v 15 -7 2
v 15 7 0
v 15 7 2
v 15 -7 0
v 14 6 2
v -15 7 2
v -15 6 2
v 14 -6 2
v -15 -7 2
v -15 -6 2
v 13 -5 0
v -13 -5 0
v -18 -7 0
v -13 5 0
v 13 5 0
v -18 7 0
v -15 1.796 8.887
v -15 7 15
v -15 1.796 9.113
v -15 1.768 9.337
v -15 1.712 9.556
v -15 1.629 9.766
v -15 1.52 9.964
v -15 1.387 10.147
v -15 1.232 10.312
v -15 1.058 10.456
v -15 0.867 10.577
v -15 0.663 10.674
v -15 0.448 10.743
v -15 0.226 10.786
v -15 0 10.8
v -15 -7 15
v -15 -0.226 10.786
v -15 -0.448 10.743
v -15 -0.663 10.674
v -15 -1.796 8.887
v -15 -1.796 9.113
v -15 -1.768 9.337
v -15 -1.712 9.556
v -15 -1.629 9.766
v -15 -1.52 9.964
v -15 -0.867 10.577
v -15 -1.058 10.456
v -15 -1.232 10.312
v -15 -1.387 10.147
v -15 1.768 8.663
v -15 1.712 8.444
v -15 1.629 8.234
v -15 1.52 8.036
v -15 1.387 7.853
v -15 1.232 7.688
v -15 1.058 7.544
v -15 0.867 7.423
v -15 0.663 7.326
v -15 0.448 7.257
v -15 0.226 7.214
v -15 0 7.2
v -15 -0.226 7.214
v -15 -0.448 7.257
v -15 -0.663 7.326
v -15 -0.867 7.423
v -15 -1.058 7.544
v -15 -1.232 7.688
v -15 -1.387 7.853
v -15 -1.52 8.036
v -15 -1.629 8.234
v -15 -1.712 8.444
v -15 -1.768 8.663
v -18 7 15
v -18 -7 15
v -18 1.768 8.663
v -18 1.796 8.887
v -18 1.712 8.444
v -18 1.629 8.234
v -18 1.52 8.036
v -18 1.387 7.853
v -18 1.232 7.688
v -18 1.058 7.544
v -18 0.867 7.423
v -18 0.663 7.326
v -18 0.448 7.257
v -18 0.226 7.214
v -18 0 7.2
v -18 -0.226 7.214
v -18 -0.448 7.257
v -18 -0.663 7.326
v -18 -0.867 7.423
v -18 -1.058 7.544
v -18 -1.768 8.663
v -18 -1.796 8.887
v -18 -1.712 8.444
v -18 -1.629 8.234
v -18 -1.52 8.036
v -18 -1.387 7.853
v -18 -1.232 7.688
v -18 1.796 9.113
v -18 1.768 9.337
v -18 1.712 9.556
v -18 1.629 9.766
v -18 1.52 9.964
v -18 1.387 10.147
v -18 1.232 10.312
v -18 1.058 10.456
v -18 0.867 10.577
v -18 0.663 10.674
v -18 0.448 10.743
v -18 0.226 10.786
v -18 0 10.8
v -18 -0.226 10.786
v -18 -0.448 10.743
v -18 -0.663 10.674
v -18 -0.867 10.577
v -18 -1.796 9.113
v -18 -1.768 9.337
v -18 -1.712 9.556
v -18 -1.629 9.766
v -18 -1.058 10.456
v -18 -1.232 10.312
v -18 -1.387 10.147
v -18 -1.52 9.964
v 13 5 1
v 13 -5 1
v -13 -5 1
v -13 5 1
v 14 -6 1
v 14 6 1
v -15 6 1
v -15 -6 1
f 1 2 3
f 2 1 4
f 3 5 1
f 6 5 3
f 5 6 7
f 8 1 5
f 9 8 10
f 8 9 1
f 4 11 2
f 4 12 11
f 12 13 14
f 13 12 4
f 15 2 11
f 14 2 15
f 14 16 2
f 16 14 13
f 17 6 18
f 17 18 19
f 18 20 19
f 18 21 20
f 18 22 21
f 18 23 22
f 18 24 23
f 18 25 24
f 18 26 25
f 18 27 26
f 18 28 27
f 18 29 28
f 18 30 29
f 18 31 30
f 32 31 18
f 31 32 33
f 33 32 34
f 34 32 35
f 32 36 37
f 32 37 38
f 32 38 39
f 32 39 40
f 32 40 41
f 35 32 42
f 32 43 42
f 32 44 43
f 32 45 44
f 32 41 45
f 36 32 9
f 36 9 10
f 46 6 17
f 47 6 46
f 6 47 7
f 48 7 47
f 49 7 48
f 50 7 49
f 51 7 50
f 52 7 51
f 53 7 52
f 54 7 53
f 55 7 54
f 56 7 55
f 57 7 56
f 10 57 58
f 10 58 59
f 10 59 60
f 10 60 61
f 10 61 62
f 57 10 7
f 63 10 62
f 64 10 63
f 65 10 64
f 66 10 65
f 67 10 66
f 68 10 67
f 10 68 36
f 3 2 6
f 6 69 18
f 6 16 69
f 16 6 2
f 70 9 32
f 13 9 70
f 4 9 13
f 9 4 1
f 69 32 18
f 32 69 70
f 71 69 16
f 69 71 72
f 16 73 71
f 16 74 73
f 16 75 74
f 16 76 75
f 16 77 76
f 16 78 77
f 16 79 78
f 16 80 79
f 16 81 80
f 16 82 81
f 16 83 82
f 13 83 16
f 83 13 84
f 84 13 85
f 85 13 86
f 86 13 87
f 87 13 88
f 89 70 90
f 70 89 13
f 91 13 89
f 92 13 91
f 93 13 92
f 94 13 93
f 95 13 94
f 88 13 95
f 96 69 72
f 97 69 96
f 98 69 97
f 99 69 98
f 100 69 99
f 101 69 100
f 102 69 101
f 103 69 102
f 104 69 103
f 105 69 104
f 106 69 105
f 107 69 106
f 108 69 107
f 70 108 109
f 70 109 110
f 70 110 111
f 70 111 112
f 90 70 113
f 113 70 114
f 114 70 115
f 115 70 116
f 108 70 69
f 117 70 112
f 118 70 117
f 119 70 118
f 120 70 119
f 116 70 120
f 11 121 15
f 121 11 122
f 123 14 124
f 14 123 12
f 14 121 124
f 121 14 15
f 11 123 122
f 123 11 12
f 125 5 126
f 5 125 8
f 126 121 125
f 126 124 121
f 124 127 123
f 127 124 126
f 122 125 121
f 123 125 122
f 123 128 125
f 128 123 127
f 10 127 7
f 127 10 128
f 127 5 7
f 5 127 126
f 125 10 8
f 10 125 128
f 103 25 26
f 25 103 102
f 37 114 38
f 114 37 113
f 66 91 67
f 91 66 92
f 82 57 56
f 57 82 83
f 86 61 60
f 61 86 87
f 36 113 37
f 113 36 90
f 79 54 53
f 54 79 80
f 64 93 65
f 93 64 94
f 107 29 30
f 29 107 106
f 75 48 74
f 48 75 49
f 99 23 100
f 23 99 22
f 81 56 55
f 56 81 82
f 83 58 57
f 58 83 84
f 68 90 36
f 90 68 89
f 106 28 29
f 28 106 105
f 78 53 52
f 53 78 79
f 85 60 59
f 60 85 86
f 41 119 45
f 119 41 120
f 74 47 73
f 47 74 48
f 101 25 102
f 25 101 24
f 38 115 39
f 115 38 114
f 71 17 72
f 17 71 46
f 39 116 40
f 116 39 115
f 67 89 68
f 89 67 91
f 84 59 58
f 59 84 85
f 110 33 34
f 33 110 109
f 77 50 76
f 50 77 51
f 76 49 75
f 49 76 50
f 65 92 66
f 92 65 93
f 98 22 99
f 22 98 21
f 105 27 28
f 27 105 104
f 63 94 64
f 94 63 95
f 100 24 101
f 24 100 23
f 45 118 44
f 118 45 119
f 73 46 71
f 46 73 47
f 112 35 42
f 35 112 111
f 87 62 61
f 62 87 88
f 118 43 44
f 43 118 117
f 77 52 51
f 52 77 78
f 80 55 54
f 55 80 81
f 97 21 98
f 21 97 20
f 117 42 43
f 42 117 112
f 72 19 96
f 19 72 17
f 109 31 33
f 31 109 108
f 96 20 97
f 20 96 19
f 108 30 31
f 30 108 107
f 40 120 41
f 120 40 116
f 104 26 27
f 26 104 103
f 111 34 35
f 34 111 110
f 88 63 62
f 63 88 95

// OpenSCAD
$fn = 50;


difference() {
	union() {
		translate(v = [-15.0000000000, -7.0000000000, 0]) {
			rotate(a = [0, 0, 0]) {
				cube(size = [30, 14, 2]);
			}
		}
		translate(v = [-18.0000000000, -7.0000000000, 0]) {
			rotate(a = [0, 0, 0]) {
				cube(size = [3, 14, 15]);
			}
		}
	}
	union() {
		translate(v = [-13.0000000000, -5.0000000000, 0]) {
			rotate(a = [0, 0, 0]) {
				cube(size = [26, 10, 2]);
			}
		}
		translate(v = [-15.0000000000, -6.0000000000, 1]) {
			rotate(a = [0, 0, 0]) {
				cube(size = [29, 12, 1]);
			}
		}
		#translate(v = [-25.0000000000, 0, 9]) {
			rotate(a = [0, 90, 0]) {
				cylinder(h = 20, r = 1.8000000000);
			}
		}
	}
}
